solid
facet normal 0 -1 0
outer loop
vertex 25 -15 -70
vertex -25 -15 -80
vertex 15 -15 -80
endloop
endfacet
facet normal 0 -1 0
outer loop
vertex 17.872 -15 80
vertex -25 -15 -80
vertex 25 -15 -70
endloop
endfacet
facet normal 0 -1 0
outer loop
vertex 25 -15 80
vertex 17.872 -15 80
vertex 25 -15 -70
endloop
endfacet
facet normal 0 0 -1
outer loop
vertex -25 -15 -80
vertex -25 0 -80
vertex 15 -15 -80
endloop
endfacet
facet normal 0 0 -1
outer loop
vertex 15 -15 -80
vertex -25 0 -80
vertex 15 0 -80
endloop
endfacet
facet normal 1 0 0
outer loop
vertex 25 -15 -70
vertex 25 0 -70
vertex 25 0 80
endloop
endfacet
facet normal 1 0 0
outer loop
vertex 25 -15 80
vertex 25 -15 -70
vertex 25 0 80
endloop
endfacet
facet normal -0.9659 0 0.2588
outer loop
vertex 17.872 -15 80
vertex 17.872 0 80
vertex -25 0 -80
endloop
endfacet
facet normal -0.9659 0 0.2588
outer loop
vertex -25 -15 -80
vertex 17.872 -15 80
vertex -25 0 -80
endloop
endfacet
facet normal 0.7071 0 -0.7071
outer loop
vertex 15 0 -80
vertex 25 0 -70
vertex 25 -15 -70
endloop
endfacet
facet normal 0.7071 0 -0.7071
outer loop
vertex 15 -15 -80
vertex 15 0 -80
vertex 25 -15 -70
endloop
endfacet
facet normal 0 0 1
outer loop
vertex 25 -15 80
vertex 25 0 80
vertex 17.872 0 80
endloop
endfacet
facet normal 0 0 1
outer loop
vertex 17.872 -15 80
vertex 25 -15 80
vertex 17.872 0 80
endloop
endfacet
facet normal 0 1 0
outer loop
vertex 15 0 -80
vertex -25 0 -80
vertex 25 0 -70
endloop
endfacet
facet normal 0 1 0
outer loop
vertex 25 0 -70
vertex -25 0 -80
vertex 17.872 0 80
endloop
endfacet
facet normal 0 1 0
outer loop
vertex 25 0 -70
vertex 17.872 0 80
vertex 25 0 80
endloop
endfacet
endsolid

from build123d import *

# Parameters (mm, degrees)
F1_DEPTH = 15
F2_SIZE  = 10


with BuildPart() as f1:
    # F0 (on Front) → F1 (new body)
    with BuildSketch(Plane.XZ):
        Polygon((17.871871, 80), (-25, -80), (25, -80), (25, 80), align=None)
    extrude(amount=F1_DEPTH)

    # F2
    f2_edges = [f1.edges().sort_by_distance(p)[0] for p in [
        (25, -7.5, -80),
    ]]
    chamfer(f2_edges, length=F2_SIZE)


solid = f1.part
